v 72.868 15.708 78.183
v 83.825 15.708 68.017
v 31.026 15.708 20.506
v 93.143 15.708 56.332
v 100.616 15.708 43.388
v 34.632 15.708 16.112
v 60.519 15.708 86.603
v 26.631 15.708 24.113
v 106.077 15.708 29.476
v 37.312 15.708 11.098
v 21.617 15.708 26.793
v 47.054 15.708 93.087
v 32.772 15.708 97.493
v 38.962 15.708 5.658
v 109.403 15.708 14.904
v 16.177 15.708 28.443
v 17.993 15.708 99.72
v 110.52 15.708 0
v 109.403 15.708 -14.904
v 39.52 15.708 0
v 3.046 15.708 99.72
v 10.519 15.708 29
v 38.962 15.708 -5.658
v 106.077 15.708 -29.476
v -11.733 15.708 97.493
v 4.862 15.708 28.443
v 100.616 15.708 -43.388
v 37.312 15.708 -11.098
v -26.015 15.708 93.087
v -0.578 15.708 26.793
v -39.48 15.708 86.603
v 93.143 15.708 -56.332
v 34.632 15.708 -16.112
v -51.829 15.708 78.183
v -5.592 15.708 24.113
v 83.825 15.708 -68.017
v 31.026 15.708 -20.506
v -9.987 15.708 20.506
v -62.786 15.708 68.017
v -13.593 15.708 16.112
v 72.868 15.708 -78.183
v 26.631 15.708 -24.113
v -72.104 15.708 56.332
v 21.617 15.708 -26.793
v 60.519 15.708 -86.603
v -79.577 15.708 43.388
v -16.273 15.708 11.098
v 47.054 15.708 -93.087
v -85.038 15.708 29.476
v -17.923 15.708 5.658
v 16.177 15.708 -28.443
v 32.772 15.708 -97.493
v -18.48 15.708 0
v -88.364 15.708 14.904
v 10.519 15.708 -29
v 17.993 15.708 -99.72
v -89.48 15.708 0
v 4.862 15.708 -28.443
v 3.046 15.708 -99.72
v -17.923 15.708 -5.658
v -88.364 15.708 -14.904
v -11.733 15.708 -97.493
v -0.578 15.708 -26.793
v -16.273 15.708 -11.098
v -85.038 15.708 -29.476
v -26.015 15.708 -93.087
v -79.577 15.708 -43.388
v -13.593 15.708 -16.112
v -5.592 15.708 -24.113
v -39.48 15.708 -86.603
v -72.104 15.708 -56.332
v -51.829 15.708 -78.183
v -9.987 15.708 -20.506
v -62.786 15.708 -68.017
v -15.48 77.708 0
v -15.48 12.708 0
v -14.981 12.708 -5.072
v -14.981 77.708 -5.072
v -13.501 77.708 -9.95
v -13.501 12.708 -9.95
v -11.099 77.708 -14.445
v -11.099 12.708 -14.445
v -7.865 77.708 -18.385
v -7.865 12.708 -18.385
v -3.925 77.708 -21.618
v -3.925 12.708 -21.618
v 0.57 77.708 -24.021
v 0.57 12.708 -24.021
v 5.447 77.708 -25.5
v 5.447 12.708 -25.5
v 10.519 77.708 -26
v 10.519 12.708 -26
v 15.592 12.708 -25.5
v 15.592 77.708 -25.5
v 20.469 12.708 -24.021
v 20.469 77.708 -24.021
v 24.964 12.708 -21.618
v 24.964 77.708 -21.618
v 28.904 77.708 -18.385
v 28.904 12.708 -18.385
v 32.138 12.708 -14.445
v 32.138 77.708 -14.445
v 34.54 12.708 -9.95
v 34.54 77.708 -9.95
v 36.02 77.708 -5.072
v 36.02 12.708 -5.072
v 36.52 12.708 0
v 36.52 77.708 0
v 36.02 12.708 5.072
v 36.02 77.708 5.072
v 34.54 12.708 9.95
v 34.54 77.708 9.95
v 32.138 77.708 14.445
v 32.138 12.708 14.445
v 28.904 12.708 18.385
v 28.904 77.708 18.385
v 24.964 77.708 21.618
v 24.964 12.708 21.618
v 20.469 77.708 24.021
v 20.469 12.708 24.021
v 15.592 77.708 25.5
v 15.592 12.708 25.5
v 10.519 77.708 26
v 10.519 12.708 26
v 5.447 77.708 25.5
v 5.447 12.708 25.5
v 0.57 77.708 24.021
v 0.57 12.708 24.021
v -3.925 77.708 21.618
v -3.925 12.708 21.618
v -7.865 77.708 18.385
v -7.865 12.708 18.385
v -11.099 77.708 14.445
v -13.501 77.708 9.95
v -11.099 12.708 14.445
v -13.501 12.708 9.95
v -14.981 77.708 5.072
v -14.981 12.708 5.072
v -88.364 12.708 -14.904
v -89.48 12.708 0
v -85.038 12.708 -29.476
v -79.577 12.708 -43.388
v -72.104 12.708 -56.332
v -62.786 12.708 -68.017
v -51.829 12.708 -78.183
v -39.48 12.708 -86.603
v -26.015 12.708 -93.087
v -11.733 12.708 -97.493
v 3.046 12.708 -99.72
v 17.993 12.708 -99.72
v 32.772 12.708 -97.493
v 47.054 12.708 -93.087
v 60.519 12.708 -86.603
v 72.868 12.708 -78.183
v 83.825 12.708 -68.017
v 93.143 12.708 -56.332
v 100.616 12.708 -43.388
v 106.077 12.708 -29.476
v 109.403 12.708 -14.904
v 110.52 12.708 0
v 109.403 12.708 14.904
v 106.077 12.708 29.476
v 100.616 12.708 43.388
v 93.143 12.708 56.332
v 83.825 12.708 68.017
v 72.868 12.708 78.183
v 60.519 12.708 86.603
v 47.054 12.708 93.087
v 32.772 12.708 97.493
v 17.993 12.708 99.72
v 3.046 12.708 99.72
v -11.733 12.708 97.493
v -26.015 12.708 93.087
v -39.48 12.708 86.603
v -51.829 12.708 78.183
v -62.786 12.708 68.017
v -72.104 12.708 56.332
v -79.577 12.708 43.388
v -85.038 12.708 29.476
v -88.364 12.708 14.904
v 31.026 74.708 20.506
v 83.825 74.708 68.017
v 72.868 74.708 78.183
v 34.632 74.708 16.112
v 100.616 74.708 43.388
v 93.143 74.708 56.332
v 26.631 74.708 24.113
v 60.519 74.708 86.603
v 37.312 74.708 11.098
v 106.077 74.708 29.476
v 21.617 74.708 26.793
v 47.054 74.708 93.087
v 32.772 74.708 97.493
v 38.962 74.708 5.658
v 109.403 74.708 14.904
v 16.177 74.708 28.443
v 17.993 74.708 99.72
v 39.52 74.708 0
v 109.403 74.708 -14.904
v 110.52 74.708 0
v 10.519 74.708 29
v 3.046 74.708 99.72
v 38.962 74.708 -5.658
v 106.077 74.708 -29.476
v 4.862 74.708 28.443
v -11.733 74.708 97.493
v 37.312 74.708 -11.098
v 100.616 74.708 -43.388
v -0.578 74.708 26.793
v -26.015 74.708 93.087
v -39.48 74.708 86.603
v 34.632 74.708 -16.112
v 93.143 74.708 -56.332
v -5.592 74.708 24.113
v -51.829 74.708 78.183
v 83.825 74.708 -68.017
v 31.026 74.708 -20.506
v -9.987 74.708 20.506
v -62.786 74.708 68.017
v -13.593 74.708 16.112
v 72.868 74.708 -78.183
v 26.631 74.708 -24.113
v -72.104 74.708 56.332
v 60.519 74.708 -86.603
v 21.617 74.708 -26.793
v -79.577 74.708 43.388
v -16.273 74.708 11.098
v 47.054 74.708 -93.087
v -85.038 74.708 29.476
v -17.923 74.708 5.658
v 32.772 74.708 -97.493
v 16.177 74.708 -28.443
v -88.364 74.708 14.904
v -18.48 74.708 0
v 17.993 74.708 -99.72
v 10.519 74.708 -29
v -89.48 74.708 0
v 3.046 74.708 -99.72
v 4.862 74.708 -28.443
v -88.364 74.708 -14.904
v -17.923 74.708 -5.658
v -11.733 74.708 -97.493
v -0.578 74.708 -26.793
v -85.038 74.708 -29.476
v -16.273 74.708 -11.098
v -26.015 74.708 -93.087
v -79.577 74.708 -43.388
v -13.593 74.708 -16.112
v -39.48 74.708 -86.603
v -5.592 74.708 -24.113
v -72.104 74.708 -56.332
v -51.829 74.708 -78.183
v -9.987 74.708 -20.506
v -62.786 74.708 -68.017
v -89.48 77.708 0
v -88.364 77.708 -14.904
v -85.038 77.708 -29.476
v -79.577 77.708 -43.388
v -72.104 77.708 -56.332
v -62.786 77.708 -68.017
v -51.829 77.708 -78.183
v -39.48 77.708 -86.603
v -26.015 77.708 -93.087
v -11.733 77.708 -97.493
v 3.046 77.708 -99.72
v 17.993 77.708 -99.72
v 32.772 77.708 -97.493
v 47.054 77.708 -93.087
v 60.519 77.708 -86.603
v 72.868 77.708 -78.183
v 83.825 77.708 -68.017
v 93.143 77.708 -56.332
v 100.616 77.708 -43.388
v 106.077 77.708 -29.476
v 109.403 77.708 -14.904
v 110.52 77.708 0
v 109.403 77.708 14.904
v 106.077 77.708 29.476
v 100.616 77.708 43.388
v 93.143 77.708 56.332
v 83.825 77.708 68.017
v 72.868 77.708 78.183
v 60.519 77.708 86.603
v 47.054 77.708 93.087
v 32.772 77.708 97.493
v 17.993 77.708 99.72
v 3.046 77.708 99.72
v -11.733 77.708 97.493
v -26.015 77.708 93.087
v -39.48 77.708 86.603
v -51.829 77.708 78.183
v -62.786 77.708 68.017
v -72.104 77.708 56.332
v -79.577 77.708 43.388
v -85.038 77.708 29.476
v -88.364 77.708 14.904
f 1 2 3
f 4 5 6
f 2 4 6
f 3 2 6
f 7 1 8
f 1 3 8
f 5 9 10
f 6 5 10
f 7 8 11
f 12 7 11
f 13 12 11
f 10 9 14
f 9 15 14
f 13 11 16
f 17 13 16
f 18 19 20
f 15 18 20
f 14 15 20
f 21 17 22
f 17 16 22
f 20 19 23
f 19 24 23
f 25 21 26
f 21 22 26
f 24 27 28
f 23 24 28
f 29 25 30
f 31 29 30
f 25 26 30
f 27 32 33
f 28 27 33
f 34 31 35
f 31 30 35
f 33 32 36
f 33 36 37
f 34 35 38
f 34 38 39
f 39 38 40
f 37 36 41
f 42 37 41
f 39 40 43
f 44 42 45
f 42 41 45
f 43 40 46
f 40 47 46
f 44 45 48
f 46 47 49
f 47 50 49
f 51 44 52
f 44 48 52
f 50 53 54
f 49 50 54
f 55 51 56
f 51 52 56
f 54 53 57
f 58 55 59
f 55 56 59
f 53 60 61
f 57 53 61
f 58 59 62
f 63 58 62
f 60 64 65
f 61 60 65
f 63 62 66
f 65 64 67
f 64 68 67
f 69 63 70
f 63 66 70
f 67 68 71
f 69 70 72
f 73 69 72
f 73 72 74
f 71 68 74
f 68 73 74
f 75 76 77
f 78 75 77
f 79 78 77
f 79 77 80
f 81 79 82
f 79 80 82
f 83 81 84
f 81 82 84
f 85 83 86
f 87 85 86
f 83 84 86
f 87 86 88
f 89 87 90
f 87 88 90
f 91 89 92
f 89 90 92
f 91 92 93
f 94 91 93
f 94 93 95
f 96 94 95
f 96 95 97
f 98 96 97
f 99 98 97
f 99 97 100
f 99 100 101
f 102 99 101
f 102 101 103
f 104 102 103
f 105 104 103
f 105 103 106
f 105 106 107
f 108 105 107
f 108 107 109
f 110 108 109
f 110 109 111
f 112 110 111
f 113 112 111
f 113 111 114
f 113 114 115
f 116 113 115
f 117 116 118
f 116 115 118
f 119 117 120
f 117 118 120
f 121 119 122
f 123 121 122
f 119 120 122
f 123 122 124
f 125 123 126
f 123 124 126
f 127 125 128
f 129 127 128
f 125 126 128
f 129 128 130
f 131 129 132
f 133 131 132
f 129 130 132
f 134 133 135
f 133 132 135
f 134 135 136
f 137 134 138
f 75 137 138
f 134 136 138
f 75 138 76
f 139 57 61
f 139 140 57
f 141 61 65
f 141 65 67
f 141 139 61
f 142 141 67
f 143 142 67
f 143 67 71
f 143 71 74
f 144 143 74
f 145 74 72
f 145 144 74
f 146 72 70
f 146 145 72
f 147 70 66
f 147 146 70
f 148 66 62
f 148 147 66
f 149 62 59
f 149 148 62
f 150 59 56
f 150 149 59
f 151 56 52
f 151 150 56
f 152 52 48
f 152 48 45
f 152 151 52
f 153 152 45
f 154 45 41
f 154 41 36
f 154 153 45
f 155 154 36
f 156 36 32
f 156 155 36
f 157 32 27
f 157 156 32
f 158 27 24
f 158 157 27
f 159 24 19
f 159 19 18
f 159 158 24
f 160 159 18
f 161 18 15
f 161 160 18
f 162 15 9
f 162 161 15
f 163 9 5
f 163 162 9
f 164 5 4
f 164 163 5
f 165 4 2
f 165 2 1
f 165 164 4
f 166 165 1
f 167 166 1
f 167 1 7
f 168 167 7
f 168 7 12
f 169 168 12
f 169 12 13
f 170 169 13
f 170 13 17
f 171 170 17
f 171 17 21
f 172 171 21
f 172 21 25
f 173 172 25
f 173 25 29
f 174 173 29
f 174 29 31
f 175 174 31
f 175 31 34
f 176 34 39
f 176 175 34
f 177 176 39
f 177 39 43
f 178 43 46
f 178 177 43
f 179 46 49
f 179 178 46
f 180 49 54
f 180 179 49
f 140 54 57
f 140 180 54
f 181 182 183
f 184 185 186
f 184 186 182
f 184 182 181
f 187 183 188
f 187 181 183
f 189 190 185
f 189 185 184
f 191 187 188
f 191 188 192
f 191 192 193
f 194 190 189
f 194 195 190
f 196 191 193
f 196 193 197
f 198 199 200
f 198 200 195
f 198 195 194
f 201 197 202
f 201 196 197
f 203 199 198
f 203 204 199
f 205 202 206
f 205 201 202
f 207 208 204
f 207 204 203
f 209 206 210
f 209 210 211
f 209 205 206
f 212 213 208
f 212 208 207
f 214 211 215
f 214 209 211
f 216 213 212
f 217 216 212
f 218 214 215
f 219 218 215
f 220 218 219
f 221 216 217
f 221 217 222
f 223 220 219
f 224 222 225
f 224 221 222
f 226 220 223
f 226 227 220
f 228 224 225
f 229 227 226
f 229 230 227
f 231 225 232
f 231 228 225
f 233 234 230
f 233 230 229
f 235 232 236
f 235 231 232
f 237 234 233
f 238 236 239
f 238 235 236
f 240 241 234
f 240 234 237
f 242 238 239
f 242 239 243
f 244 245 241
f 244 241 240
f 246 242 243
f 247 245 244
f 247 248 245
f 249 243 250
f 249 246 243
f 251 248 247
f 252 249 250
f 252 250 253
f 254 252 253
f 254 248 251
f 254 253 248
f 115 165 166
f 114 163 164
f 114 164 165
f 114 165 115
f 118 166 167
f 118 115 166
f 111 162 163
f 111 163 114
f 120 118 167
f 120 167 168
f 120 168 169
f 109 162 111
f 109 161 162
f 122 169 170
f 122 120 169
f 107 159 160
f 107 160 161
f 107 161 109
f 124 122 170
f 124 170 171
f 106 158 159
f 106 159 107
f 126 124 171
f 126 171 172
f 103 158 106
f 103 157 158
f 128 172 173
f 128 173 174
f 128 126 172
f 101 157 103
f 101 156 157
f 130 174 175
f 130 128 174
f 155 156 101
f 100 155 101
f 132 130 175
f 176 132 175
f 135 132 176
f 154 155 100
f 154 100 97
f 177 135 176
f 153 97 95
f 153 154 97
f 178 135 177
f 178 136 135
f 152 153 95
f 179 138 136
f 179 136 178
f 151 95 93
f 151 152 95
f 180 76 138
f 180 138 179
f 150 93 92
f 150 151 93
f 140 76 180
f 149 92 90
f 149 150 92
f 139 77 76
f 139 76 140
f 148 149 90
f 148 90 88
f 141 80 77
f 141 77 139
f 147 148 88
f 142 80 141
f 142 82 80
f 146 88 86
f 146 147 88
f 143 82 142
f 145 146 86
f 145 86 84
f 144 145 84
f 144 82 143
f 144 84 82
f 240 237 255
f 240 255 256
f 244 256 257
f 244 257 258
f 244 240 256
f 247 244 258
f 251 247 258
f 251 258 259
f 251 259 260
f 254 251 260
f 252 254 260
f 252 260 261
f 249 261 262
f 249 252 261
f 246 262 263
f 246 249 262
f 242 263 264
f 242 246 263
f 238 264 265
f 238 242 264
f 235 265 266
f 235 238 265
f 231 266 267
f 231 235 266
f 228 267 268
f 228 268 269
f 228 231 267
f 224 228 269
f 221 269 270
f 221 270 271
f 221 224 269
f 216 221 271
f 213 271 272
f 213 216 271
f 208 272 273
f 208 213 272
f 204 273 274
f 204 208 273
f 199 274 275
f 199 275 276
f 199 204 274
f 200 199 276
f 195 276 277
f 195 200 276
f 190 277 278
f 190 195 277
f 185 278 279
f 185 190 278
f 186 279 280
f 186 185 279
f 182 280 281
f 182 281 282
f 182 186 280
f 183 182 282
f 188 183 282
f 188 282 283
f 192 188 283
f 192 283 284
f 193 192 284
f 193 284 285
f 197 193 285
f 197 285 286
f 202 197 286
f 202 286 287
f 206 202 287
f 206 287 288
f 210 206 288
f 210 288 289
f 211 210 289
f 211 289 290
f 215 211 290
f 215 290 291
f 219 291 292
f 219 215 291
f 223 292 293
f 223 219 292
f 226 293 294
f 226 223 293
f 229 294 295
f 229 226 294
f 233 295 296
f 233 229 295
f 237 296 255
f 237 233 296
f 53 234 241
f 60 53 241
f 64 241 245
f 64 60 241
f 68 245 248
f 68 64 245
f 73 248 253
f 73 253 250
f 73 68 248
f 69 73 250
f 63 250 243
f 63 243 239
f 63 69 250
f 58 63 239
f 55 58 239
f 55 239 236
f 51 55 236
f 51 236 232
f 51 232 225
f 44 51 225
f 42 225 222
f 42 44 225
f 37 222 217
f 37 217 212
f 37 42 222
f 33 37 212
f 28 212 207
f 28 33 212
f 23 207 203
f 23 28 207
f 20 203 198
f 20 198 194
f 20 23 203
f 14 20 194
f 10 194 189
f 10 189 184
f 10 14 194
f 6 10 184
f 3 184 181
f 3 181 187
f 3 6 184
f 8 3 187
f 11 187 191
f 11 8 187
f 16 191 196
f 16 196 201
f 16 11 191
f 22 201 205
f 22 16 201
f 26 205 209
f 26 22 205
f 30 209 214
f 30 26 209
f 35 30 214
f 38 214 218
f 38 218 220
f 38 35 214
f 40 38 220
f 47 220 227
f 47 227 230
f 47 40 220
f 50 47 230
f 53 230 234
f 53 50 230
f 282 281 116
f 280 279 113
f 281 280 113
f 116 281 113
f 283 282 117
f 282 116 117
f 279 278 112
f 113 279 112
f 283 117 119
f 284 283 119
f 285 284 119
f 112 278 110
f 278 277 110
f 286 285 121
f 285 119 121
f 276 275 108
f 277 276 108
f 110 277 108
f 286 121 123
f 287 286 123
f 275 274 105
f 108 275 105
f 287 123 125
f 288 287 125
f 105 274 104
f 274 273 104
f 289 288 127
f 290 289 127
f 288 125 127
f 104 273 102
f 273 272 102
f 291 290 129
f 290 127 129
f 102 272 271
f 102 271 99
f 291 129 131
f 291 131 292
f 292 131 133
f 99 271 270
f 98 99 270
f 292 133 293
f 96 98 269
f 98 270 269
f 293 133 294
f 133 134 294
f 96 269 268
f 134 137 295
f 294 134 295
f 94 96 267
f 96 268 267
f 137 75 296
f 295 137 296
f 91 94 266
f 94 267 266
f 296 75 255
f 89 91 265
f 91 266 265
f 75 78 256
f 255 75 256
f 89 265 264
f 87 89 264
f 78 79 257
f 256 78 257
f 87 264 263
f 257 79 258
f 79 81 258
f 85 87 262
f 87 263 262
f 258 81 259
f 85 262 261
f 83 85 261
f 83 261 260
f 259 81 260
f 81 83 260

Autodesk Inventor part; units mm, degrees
ref_plane "YZ Plane" through (0, 0, 0) normal (1, 0, 0) x (0, 1, 0)
ref_plane "XZ Plane" through (0, 0, 0) normal (0, 1, 0) x (-1, 0, 0)
ref_plane "XY Plane" through (0, 0, 0) normal (0, 0, 1) x (1, 0, 0)
sketch "Szkic1" plane through (0, 0, 0) normal (0, 0, 1) x (1, 0, 0)
  line L0 (10.5195, 87.461) -> (10.5195, -76.7273)
  line L1 (-15.4805, 77.7078) -> (-89.4805, 77.7078)
  line L2 (-89.4805, 77.7078) -> (-89.4805, 74.7078)
  line L3 (-89.4805, 74.7078) -> (-18.4805, 74.7078)
  line L4 (-18.4805, 74.7078) -> (-18.4805, 15.7078)
  line L5 (-18.4805, 15.7078) -> (-89.4805, 15.7078)
  line L6 (-89.4805, 15.7078) -> (-89.4805, 12.7078)
  line L7 (-89.4805, 12.7078) -> (-15.4805, 12.7078)
  line L8 (-15.4805, 77.7078) -> (-15.4805, 12.7078)
  point P0 (0, 0)
  dimension "d0" = 65
  dimension "d1" = 52
  dimension "d2" = 58
  dimension "d3" = 3
  dimension "d4" = 3
  dimension "d5" = 200
revolve "Obrót1" add sketch "Szkic1" angle 360 about axis through (10.5195, 87.461, 0) along (0, -1, 0)
properties part number "szpula"
